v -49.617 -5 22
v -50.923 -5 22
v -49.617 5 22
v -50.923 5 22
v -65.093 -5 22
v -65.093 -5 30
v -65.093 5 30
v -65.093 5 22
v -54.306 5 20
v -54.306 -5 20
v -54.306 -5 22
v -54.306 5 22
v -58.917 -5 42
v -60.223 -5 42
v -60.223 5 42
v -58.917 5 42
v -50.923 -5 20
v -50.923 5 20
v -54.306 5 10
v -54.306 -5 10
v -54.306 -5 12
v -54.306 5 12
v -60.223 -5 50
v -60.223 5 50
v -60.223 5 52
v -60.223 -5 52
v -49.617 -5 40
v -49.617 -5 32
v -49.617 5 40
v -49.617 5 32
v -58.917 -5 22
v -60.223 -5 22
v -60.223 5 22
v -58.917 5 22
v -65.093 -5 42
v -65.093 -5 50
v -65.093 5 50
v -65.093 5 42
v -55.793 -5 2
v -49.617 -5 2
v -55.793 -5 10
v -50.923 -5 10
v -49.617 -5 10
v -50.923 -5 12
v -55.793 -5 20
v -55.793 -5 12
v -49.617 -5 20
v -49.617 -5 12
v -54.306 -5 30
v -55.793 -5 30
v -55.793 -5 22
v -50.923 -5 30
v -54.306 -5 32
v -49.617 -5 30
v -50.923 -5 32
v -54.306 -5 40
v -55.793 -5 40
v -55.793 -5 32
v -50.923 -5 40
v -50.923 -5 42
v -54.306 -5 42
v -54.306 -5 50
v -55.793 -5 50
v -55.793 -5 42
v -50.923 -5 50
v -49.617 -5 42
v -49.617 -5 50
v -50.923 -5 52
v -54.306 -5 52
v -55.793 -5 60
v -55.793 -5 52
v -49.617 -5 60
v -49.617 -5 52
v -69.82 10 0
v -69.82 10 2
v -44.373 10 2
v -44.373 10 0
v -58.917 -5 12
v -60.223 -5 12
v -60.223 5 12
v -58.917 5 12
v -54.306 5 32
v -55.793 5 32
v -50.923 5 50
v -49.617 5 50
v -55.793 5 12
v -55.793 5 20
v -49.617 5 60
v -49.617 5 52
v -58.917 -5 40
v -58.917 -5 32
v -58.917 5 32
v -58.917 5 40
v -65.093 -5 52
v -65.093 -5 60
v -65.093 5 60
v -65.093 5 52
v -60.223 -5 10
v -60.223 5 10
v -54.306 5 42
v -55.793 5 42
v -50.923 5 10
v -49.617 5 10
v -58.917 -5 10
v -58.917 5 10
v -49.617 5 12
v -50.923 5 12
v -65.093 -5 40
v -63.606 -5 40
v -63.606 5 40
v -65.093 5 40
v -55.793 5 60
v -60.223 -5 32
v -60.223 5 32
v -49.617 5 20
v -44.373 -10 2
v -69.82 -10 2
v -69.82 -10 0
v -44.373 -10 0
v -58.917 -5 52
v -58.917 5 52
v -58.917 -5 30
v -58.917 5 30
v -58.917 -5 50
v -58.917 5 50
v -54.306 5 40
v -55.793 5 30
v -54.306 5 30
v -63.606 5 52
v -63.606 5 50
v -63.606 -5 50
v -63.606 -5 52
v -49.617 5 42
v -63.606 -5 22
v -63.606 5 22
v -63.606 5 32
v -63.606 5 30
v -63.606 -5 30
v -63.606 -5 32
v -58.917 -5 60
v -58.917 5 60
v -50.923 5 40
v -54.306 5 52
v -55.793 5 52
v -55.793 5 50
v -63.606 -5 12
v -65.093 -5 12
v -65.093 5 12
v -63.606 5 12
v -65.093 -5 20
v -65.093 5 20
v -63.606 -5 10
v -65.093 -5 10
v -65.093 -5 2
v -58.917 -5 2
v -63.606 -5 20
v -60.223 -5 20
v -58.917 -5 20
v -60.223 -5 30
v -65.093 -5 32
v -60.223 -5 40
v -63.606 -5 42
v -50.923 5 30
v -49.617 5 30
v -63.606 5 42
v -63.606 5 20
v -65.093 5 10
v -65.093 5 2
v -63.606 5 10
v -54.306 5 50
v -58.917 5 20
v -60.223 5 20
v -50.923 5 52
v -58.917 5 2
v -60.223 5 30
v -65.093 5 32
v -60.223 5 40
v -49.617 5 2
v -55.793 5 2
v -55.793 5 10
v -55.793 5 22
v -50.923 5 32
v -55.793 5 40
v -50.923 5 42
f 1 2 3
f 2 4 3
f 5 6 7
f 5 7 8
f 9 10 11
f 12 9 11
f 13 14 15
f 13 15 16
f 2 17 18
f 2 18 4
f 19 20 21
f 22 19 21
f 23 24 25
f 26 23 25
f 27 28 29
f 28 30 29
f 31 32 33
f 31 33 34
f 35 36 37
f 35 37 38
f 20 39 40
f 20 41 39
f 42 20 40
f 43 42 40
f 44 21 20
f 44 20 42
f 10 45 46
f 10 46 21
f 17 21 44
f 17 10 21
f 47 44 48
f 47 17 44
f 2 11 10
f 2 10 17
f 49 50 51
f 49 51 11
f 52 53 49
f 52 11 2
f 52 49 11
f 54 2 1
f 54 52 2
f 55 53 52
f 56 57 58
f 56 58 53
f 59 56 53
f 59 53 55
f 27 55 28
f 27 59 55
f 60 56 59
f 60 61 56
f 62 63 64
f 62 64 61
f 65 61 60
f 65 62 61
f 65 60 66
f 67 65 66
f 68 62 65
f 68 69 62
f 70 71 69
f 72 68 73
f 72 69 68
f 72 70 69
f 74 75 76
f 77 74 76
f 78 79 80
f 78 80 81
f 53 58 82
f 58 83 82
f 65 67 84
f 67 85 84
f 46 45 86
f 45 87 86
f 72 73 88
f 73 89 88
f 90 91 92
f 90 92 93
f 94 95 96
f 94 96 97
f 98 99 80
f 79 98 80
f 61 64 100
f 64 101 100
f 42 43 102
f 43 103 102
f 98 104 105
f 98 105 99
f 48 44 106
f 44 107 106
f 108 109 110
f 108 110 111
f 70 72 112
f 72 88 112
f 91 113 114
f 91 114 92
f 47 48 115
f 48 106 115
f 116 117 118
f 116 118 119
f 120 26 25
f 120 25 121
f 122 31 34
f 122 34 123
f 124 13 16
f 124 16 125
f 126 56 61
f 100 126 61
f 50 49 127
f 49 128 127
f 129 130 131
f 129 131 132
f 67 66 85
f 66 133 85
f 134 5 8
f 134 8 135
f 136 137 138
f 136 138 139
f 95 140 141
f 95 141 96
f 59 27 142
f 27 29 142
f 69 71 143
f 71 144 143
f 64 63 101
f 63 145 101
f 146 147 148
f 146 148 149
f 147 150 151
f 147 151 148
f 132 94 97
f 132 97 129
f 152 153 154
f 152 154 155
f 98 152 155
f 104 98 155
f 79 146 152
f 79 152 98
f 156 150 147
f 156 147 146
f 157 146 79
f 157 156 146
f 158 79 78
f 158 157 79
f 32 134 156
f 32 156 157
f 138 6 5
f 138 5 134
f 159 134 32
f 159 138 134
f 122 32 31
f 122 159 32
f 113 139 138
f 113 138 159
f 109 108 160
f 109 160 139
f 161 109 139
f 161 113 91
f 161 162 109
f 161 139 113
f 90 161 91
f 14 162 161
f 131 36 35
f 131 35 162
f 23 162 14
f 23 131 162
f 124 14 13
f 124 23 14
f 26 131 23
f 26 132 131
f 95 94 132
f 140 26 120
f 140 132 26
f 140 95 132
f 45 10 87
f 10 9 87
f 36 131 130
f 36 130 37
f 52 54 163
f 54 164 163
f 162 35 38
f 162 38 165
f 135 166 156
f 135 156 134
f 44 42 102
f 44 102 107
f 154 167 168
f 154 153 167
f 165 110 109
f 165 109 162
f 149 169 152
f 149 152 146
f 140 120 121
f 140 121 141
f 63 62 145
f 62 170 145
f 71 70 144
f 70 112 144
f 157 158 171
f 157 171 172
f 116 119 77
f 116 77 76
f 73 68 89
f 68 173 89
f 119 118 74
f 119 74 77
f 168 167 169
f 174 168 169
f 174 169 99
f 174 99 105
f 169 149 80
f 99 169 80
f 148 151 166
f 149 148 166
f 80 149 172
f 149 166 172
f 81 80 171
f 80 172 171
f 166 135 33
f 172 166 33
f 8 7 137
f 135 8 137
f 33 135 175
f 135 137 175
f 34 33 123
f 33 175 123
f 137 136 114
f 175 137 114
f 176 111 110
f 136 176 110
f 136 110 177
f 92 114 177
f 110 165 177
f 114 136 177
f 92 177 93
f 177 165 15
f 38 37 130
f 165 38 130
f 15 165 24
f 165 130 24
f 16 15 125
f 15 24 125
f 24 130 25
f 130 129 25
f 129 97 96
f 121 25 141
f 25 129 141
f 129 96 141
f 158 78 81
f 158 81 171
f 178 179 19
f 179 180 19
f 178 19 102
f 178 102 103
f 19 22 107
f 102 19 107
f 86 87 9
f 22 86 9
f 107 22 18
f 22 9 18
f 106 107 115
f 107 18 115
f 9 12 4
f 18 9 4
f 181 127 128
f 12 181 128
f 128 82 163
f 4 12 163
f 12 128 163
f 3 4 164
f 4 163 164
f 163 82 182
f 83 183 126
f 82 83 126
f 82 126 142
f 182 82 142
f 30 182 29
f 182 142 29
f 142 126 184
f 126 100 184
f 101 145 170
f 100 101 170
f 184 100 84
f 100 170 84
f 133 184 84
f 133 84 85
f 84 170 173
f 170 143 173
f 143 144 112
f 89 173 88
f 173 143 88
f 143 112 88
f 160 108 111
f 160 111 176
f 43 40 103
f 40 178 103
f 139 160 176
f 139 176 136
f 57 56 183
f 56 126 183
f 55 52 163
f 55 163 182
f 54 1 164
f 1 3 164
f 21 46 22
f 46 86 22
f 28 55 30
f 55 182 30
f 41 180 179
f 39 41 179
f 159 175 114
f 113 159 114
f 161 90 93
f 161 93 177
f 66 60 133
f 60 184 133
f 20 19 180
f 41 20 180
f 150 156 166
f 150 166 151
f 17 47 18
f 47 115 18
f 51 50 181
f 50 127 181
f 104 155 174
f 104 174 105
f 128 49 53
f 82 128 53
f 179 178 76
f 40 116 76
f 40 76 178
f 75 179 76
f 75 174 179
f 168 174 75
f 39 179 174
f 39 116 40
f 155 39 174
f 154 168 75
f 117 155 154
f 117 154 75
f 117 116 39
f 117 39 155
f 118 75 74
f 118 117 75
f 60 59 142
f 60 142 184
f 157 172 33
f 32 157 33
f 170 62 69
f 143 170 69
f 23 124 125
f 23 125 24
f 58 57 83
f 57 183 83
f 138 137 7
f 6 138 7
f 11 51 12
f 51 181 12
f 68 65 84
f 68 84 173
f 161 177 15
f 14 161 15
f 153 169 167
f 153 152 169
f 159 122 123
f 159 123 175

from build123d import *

# Parameters (mm, degrees)
F1_DEPTH = 10
F0_W     = 3.383045
F0_H     = 2
F2_DEPTH = 5


with BuildPart() as f1:
    # F0 (on Front) → F1 (new body, symmetric)
    with BuildSketch(Plane.XZ):
        Polygon((-69.820315, 2), (-69.820315, 0), (-44.373278, 0), (-44.373278, 2), (-49.617426, 2), (-55.793015, 2), (-58.917426, 2), (-65.093015, 2), align=None)
    extrude(amount=F1_DEPTH, both=True)

    # F0 (on Front) → F2 (join, symmetric)
    with BuildSketch(Plane.XZ):
        Polygon((-55.793015, 2), (-49.617426, 2), (-49.617426, 10), (-50.923162, 10), (-54.306207, 10), (-55.793015, 10), align=None)
        Polygon((-65.093015, 10), (-65.093015, 2), (-58.917426, 2), (-58.917426, 10), (-60.223162, 10), (-63.606207, 10), align=None)
        Polygon((-65.093017, 22), (-63.606208, 22), (-60.223163, 22), (-58.917428, 22), (-58.917428, 30), (-60.223164, 30), (-63.606209, 30), (-65.093017, 30), align=None)
        Polygon((-65.093018, 32), (-63.606209, 32), (-60.223164, 32), (-58.917429, 32), (-58.917429, 40), (-60.223165, 40), (-63.60621, 40), (-65.093018, 40), align=None)
        with Locations((-61.914687, 31)):
            Rectangle(F0_W, F0_H)
        with Locations((-52.614688, 51)):
            Rectangle(F0_W, F0_H)
        with Locations((-61.914685, 21)):
            Rectangle(F0_W, F0_H)
        with Locations((-52.614684, 11)):
            Rectangle(F0_W, F0_H)
        Polygon((-54.30621, 42), (-50.923165, 42), (-49.61743, 42), (-49.61743, 50), (-50.923166, 50), (-54.306211, 50), (-55.793019, 50), (-55.793019, 42), align=None)
        Polygon((-65.093019, 42), (-63.60621, 42), (-60.223165, 42), (-58.91743, 42), (-58.91743, 50), (-60.223166, 50), (-63.606211, 50), (-65.093019, 50), align=None)
        with Locations((-61.914684, 11)):
            Rectangle(F0_W, F0_H)
        with Locations((-52.614688, 41)):
            Rectangle(F0_W, F0_H)
        Polygon((-54.306209, 32), (-50.923164, 32), (-49.617429, 32), (-49.617429, 40), (-50.923165, 40), (-54.30621, 40), (-55.793018, 40), (-55.793018, 32), align=None)
        Polygon((-54.306207, 12), (-50.923162, 12), (-49.617427, 12), (-49.617427, 20), (-50.923163, 20), (-54.306208, 20), (-55.793016, 20), (-55.793016, 12), align=None)
        Polygon((-54.306208, 22), (-50.923163, 22), (-49.617428, 22), (-49.617428, 30), (-50.923164, 30), (-54.306209, 30), (-55.793017, 30), (-55.793017, 22), align=None)
        with Locations((-52.614686, 31)):
            Rectangle(F0_W, F0_H)
        Polygon((-65.093016, 12), (-63.606207, 12), (-60.223162, 12), (-58.917427, 12), (-58.917427, 20), (-60.223163, 20), (-63.606208, 20), (-65.093016, 20), align=None)
        Polygon((-54.306211, 52), (-50.923166, 52), (-49.617431, 52), (-49.617431, 60), (-50.923167, 60), (-54.306212, 60), (-55.79302, 60), (-55.79302, 52), align=None)
        with Locations((-61.914688, 51)):
            Rectangle(F0_W, F0_H)
        with Locations((-61.914687, 41)):
            Rectangle(F0_W, F0_H)
        with Locations((-52.614685, 21)):
            Rectangle(F0_W, F0_H)
        Polygon((-65.09302, 52), (-63.606211, 52), (-60.223166, 52), (-58.917431, 52), (-58.917431, 60), (-60.223167, 60), (-63.606212, 60), (-65.09302, 60), align=None)
    extrude(amount=F2_DEPTH, both=True)


solid = f1.part
